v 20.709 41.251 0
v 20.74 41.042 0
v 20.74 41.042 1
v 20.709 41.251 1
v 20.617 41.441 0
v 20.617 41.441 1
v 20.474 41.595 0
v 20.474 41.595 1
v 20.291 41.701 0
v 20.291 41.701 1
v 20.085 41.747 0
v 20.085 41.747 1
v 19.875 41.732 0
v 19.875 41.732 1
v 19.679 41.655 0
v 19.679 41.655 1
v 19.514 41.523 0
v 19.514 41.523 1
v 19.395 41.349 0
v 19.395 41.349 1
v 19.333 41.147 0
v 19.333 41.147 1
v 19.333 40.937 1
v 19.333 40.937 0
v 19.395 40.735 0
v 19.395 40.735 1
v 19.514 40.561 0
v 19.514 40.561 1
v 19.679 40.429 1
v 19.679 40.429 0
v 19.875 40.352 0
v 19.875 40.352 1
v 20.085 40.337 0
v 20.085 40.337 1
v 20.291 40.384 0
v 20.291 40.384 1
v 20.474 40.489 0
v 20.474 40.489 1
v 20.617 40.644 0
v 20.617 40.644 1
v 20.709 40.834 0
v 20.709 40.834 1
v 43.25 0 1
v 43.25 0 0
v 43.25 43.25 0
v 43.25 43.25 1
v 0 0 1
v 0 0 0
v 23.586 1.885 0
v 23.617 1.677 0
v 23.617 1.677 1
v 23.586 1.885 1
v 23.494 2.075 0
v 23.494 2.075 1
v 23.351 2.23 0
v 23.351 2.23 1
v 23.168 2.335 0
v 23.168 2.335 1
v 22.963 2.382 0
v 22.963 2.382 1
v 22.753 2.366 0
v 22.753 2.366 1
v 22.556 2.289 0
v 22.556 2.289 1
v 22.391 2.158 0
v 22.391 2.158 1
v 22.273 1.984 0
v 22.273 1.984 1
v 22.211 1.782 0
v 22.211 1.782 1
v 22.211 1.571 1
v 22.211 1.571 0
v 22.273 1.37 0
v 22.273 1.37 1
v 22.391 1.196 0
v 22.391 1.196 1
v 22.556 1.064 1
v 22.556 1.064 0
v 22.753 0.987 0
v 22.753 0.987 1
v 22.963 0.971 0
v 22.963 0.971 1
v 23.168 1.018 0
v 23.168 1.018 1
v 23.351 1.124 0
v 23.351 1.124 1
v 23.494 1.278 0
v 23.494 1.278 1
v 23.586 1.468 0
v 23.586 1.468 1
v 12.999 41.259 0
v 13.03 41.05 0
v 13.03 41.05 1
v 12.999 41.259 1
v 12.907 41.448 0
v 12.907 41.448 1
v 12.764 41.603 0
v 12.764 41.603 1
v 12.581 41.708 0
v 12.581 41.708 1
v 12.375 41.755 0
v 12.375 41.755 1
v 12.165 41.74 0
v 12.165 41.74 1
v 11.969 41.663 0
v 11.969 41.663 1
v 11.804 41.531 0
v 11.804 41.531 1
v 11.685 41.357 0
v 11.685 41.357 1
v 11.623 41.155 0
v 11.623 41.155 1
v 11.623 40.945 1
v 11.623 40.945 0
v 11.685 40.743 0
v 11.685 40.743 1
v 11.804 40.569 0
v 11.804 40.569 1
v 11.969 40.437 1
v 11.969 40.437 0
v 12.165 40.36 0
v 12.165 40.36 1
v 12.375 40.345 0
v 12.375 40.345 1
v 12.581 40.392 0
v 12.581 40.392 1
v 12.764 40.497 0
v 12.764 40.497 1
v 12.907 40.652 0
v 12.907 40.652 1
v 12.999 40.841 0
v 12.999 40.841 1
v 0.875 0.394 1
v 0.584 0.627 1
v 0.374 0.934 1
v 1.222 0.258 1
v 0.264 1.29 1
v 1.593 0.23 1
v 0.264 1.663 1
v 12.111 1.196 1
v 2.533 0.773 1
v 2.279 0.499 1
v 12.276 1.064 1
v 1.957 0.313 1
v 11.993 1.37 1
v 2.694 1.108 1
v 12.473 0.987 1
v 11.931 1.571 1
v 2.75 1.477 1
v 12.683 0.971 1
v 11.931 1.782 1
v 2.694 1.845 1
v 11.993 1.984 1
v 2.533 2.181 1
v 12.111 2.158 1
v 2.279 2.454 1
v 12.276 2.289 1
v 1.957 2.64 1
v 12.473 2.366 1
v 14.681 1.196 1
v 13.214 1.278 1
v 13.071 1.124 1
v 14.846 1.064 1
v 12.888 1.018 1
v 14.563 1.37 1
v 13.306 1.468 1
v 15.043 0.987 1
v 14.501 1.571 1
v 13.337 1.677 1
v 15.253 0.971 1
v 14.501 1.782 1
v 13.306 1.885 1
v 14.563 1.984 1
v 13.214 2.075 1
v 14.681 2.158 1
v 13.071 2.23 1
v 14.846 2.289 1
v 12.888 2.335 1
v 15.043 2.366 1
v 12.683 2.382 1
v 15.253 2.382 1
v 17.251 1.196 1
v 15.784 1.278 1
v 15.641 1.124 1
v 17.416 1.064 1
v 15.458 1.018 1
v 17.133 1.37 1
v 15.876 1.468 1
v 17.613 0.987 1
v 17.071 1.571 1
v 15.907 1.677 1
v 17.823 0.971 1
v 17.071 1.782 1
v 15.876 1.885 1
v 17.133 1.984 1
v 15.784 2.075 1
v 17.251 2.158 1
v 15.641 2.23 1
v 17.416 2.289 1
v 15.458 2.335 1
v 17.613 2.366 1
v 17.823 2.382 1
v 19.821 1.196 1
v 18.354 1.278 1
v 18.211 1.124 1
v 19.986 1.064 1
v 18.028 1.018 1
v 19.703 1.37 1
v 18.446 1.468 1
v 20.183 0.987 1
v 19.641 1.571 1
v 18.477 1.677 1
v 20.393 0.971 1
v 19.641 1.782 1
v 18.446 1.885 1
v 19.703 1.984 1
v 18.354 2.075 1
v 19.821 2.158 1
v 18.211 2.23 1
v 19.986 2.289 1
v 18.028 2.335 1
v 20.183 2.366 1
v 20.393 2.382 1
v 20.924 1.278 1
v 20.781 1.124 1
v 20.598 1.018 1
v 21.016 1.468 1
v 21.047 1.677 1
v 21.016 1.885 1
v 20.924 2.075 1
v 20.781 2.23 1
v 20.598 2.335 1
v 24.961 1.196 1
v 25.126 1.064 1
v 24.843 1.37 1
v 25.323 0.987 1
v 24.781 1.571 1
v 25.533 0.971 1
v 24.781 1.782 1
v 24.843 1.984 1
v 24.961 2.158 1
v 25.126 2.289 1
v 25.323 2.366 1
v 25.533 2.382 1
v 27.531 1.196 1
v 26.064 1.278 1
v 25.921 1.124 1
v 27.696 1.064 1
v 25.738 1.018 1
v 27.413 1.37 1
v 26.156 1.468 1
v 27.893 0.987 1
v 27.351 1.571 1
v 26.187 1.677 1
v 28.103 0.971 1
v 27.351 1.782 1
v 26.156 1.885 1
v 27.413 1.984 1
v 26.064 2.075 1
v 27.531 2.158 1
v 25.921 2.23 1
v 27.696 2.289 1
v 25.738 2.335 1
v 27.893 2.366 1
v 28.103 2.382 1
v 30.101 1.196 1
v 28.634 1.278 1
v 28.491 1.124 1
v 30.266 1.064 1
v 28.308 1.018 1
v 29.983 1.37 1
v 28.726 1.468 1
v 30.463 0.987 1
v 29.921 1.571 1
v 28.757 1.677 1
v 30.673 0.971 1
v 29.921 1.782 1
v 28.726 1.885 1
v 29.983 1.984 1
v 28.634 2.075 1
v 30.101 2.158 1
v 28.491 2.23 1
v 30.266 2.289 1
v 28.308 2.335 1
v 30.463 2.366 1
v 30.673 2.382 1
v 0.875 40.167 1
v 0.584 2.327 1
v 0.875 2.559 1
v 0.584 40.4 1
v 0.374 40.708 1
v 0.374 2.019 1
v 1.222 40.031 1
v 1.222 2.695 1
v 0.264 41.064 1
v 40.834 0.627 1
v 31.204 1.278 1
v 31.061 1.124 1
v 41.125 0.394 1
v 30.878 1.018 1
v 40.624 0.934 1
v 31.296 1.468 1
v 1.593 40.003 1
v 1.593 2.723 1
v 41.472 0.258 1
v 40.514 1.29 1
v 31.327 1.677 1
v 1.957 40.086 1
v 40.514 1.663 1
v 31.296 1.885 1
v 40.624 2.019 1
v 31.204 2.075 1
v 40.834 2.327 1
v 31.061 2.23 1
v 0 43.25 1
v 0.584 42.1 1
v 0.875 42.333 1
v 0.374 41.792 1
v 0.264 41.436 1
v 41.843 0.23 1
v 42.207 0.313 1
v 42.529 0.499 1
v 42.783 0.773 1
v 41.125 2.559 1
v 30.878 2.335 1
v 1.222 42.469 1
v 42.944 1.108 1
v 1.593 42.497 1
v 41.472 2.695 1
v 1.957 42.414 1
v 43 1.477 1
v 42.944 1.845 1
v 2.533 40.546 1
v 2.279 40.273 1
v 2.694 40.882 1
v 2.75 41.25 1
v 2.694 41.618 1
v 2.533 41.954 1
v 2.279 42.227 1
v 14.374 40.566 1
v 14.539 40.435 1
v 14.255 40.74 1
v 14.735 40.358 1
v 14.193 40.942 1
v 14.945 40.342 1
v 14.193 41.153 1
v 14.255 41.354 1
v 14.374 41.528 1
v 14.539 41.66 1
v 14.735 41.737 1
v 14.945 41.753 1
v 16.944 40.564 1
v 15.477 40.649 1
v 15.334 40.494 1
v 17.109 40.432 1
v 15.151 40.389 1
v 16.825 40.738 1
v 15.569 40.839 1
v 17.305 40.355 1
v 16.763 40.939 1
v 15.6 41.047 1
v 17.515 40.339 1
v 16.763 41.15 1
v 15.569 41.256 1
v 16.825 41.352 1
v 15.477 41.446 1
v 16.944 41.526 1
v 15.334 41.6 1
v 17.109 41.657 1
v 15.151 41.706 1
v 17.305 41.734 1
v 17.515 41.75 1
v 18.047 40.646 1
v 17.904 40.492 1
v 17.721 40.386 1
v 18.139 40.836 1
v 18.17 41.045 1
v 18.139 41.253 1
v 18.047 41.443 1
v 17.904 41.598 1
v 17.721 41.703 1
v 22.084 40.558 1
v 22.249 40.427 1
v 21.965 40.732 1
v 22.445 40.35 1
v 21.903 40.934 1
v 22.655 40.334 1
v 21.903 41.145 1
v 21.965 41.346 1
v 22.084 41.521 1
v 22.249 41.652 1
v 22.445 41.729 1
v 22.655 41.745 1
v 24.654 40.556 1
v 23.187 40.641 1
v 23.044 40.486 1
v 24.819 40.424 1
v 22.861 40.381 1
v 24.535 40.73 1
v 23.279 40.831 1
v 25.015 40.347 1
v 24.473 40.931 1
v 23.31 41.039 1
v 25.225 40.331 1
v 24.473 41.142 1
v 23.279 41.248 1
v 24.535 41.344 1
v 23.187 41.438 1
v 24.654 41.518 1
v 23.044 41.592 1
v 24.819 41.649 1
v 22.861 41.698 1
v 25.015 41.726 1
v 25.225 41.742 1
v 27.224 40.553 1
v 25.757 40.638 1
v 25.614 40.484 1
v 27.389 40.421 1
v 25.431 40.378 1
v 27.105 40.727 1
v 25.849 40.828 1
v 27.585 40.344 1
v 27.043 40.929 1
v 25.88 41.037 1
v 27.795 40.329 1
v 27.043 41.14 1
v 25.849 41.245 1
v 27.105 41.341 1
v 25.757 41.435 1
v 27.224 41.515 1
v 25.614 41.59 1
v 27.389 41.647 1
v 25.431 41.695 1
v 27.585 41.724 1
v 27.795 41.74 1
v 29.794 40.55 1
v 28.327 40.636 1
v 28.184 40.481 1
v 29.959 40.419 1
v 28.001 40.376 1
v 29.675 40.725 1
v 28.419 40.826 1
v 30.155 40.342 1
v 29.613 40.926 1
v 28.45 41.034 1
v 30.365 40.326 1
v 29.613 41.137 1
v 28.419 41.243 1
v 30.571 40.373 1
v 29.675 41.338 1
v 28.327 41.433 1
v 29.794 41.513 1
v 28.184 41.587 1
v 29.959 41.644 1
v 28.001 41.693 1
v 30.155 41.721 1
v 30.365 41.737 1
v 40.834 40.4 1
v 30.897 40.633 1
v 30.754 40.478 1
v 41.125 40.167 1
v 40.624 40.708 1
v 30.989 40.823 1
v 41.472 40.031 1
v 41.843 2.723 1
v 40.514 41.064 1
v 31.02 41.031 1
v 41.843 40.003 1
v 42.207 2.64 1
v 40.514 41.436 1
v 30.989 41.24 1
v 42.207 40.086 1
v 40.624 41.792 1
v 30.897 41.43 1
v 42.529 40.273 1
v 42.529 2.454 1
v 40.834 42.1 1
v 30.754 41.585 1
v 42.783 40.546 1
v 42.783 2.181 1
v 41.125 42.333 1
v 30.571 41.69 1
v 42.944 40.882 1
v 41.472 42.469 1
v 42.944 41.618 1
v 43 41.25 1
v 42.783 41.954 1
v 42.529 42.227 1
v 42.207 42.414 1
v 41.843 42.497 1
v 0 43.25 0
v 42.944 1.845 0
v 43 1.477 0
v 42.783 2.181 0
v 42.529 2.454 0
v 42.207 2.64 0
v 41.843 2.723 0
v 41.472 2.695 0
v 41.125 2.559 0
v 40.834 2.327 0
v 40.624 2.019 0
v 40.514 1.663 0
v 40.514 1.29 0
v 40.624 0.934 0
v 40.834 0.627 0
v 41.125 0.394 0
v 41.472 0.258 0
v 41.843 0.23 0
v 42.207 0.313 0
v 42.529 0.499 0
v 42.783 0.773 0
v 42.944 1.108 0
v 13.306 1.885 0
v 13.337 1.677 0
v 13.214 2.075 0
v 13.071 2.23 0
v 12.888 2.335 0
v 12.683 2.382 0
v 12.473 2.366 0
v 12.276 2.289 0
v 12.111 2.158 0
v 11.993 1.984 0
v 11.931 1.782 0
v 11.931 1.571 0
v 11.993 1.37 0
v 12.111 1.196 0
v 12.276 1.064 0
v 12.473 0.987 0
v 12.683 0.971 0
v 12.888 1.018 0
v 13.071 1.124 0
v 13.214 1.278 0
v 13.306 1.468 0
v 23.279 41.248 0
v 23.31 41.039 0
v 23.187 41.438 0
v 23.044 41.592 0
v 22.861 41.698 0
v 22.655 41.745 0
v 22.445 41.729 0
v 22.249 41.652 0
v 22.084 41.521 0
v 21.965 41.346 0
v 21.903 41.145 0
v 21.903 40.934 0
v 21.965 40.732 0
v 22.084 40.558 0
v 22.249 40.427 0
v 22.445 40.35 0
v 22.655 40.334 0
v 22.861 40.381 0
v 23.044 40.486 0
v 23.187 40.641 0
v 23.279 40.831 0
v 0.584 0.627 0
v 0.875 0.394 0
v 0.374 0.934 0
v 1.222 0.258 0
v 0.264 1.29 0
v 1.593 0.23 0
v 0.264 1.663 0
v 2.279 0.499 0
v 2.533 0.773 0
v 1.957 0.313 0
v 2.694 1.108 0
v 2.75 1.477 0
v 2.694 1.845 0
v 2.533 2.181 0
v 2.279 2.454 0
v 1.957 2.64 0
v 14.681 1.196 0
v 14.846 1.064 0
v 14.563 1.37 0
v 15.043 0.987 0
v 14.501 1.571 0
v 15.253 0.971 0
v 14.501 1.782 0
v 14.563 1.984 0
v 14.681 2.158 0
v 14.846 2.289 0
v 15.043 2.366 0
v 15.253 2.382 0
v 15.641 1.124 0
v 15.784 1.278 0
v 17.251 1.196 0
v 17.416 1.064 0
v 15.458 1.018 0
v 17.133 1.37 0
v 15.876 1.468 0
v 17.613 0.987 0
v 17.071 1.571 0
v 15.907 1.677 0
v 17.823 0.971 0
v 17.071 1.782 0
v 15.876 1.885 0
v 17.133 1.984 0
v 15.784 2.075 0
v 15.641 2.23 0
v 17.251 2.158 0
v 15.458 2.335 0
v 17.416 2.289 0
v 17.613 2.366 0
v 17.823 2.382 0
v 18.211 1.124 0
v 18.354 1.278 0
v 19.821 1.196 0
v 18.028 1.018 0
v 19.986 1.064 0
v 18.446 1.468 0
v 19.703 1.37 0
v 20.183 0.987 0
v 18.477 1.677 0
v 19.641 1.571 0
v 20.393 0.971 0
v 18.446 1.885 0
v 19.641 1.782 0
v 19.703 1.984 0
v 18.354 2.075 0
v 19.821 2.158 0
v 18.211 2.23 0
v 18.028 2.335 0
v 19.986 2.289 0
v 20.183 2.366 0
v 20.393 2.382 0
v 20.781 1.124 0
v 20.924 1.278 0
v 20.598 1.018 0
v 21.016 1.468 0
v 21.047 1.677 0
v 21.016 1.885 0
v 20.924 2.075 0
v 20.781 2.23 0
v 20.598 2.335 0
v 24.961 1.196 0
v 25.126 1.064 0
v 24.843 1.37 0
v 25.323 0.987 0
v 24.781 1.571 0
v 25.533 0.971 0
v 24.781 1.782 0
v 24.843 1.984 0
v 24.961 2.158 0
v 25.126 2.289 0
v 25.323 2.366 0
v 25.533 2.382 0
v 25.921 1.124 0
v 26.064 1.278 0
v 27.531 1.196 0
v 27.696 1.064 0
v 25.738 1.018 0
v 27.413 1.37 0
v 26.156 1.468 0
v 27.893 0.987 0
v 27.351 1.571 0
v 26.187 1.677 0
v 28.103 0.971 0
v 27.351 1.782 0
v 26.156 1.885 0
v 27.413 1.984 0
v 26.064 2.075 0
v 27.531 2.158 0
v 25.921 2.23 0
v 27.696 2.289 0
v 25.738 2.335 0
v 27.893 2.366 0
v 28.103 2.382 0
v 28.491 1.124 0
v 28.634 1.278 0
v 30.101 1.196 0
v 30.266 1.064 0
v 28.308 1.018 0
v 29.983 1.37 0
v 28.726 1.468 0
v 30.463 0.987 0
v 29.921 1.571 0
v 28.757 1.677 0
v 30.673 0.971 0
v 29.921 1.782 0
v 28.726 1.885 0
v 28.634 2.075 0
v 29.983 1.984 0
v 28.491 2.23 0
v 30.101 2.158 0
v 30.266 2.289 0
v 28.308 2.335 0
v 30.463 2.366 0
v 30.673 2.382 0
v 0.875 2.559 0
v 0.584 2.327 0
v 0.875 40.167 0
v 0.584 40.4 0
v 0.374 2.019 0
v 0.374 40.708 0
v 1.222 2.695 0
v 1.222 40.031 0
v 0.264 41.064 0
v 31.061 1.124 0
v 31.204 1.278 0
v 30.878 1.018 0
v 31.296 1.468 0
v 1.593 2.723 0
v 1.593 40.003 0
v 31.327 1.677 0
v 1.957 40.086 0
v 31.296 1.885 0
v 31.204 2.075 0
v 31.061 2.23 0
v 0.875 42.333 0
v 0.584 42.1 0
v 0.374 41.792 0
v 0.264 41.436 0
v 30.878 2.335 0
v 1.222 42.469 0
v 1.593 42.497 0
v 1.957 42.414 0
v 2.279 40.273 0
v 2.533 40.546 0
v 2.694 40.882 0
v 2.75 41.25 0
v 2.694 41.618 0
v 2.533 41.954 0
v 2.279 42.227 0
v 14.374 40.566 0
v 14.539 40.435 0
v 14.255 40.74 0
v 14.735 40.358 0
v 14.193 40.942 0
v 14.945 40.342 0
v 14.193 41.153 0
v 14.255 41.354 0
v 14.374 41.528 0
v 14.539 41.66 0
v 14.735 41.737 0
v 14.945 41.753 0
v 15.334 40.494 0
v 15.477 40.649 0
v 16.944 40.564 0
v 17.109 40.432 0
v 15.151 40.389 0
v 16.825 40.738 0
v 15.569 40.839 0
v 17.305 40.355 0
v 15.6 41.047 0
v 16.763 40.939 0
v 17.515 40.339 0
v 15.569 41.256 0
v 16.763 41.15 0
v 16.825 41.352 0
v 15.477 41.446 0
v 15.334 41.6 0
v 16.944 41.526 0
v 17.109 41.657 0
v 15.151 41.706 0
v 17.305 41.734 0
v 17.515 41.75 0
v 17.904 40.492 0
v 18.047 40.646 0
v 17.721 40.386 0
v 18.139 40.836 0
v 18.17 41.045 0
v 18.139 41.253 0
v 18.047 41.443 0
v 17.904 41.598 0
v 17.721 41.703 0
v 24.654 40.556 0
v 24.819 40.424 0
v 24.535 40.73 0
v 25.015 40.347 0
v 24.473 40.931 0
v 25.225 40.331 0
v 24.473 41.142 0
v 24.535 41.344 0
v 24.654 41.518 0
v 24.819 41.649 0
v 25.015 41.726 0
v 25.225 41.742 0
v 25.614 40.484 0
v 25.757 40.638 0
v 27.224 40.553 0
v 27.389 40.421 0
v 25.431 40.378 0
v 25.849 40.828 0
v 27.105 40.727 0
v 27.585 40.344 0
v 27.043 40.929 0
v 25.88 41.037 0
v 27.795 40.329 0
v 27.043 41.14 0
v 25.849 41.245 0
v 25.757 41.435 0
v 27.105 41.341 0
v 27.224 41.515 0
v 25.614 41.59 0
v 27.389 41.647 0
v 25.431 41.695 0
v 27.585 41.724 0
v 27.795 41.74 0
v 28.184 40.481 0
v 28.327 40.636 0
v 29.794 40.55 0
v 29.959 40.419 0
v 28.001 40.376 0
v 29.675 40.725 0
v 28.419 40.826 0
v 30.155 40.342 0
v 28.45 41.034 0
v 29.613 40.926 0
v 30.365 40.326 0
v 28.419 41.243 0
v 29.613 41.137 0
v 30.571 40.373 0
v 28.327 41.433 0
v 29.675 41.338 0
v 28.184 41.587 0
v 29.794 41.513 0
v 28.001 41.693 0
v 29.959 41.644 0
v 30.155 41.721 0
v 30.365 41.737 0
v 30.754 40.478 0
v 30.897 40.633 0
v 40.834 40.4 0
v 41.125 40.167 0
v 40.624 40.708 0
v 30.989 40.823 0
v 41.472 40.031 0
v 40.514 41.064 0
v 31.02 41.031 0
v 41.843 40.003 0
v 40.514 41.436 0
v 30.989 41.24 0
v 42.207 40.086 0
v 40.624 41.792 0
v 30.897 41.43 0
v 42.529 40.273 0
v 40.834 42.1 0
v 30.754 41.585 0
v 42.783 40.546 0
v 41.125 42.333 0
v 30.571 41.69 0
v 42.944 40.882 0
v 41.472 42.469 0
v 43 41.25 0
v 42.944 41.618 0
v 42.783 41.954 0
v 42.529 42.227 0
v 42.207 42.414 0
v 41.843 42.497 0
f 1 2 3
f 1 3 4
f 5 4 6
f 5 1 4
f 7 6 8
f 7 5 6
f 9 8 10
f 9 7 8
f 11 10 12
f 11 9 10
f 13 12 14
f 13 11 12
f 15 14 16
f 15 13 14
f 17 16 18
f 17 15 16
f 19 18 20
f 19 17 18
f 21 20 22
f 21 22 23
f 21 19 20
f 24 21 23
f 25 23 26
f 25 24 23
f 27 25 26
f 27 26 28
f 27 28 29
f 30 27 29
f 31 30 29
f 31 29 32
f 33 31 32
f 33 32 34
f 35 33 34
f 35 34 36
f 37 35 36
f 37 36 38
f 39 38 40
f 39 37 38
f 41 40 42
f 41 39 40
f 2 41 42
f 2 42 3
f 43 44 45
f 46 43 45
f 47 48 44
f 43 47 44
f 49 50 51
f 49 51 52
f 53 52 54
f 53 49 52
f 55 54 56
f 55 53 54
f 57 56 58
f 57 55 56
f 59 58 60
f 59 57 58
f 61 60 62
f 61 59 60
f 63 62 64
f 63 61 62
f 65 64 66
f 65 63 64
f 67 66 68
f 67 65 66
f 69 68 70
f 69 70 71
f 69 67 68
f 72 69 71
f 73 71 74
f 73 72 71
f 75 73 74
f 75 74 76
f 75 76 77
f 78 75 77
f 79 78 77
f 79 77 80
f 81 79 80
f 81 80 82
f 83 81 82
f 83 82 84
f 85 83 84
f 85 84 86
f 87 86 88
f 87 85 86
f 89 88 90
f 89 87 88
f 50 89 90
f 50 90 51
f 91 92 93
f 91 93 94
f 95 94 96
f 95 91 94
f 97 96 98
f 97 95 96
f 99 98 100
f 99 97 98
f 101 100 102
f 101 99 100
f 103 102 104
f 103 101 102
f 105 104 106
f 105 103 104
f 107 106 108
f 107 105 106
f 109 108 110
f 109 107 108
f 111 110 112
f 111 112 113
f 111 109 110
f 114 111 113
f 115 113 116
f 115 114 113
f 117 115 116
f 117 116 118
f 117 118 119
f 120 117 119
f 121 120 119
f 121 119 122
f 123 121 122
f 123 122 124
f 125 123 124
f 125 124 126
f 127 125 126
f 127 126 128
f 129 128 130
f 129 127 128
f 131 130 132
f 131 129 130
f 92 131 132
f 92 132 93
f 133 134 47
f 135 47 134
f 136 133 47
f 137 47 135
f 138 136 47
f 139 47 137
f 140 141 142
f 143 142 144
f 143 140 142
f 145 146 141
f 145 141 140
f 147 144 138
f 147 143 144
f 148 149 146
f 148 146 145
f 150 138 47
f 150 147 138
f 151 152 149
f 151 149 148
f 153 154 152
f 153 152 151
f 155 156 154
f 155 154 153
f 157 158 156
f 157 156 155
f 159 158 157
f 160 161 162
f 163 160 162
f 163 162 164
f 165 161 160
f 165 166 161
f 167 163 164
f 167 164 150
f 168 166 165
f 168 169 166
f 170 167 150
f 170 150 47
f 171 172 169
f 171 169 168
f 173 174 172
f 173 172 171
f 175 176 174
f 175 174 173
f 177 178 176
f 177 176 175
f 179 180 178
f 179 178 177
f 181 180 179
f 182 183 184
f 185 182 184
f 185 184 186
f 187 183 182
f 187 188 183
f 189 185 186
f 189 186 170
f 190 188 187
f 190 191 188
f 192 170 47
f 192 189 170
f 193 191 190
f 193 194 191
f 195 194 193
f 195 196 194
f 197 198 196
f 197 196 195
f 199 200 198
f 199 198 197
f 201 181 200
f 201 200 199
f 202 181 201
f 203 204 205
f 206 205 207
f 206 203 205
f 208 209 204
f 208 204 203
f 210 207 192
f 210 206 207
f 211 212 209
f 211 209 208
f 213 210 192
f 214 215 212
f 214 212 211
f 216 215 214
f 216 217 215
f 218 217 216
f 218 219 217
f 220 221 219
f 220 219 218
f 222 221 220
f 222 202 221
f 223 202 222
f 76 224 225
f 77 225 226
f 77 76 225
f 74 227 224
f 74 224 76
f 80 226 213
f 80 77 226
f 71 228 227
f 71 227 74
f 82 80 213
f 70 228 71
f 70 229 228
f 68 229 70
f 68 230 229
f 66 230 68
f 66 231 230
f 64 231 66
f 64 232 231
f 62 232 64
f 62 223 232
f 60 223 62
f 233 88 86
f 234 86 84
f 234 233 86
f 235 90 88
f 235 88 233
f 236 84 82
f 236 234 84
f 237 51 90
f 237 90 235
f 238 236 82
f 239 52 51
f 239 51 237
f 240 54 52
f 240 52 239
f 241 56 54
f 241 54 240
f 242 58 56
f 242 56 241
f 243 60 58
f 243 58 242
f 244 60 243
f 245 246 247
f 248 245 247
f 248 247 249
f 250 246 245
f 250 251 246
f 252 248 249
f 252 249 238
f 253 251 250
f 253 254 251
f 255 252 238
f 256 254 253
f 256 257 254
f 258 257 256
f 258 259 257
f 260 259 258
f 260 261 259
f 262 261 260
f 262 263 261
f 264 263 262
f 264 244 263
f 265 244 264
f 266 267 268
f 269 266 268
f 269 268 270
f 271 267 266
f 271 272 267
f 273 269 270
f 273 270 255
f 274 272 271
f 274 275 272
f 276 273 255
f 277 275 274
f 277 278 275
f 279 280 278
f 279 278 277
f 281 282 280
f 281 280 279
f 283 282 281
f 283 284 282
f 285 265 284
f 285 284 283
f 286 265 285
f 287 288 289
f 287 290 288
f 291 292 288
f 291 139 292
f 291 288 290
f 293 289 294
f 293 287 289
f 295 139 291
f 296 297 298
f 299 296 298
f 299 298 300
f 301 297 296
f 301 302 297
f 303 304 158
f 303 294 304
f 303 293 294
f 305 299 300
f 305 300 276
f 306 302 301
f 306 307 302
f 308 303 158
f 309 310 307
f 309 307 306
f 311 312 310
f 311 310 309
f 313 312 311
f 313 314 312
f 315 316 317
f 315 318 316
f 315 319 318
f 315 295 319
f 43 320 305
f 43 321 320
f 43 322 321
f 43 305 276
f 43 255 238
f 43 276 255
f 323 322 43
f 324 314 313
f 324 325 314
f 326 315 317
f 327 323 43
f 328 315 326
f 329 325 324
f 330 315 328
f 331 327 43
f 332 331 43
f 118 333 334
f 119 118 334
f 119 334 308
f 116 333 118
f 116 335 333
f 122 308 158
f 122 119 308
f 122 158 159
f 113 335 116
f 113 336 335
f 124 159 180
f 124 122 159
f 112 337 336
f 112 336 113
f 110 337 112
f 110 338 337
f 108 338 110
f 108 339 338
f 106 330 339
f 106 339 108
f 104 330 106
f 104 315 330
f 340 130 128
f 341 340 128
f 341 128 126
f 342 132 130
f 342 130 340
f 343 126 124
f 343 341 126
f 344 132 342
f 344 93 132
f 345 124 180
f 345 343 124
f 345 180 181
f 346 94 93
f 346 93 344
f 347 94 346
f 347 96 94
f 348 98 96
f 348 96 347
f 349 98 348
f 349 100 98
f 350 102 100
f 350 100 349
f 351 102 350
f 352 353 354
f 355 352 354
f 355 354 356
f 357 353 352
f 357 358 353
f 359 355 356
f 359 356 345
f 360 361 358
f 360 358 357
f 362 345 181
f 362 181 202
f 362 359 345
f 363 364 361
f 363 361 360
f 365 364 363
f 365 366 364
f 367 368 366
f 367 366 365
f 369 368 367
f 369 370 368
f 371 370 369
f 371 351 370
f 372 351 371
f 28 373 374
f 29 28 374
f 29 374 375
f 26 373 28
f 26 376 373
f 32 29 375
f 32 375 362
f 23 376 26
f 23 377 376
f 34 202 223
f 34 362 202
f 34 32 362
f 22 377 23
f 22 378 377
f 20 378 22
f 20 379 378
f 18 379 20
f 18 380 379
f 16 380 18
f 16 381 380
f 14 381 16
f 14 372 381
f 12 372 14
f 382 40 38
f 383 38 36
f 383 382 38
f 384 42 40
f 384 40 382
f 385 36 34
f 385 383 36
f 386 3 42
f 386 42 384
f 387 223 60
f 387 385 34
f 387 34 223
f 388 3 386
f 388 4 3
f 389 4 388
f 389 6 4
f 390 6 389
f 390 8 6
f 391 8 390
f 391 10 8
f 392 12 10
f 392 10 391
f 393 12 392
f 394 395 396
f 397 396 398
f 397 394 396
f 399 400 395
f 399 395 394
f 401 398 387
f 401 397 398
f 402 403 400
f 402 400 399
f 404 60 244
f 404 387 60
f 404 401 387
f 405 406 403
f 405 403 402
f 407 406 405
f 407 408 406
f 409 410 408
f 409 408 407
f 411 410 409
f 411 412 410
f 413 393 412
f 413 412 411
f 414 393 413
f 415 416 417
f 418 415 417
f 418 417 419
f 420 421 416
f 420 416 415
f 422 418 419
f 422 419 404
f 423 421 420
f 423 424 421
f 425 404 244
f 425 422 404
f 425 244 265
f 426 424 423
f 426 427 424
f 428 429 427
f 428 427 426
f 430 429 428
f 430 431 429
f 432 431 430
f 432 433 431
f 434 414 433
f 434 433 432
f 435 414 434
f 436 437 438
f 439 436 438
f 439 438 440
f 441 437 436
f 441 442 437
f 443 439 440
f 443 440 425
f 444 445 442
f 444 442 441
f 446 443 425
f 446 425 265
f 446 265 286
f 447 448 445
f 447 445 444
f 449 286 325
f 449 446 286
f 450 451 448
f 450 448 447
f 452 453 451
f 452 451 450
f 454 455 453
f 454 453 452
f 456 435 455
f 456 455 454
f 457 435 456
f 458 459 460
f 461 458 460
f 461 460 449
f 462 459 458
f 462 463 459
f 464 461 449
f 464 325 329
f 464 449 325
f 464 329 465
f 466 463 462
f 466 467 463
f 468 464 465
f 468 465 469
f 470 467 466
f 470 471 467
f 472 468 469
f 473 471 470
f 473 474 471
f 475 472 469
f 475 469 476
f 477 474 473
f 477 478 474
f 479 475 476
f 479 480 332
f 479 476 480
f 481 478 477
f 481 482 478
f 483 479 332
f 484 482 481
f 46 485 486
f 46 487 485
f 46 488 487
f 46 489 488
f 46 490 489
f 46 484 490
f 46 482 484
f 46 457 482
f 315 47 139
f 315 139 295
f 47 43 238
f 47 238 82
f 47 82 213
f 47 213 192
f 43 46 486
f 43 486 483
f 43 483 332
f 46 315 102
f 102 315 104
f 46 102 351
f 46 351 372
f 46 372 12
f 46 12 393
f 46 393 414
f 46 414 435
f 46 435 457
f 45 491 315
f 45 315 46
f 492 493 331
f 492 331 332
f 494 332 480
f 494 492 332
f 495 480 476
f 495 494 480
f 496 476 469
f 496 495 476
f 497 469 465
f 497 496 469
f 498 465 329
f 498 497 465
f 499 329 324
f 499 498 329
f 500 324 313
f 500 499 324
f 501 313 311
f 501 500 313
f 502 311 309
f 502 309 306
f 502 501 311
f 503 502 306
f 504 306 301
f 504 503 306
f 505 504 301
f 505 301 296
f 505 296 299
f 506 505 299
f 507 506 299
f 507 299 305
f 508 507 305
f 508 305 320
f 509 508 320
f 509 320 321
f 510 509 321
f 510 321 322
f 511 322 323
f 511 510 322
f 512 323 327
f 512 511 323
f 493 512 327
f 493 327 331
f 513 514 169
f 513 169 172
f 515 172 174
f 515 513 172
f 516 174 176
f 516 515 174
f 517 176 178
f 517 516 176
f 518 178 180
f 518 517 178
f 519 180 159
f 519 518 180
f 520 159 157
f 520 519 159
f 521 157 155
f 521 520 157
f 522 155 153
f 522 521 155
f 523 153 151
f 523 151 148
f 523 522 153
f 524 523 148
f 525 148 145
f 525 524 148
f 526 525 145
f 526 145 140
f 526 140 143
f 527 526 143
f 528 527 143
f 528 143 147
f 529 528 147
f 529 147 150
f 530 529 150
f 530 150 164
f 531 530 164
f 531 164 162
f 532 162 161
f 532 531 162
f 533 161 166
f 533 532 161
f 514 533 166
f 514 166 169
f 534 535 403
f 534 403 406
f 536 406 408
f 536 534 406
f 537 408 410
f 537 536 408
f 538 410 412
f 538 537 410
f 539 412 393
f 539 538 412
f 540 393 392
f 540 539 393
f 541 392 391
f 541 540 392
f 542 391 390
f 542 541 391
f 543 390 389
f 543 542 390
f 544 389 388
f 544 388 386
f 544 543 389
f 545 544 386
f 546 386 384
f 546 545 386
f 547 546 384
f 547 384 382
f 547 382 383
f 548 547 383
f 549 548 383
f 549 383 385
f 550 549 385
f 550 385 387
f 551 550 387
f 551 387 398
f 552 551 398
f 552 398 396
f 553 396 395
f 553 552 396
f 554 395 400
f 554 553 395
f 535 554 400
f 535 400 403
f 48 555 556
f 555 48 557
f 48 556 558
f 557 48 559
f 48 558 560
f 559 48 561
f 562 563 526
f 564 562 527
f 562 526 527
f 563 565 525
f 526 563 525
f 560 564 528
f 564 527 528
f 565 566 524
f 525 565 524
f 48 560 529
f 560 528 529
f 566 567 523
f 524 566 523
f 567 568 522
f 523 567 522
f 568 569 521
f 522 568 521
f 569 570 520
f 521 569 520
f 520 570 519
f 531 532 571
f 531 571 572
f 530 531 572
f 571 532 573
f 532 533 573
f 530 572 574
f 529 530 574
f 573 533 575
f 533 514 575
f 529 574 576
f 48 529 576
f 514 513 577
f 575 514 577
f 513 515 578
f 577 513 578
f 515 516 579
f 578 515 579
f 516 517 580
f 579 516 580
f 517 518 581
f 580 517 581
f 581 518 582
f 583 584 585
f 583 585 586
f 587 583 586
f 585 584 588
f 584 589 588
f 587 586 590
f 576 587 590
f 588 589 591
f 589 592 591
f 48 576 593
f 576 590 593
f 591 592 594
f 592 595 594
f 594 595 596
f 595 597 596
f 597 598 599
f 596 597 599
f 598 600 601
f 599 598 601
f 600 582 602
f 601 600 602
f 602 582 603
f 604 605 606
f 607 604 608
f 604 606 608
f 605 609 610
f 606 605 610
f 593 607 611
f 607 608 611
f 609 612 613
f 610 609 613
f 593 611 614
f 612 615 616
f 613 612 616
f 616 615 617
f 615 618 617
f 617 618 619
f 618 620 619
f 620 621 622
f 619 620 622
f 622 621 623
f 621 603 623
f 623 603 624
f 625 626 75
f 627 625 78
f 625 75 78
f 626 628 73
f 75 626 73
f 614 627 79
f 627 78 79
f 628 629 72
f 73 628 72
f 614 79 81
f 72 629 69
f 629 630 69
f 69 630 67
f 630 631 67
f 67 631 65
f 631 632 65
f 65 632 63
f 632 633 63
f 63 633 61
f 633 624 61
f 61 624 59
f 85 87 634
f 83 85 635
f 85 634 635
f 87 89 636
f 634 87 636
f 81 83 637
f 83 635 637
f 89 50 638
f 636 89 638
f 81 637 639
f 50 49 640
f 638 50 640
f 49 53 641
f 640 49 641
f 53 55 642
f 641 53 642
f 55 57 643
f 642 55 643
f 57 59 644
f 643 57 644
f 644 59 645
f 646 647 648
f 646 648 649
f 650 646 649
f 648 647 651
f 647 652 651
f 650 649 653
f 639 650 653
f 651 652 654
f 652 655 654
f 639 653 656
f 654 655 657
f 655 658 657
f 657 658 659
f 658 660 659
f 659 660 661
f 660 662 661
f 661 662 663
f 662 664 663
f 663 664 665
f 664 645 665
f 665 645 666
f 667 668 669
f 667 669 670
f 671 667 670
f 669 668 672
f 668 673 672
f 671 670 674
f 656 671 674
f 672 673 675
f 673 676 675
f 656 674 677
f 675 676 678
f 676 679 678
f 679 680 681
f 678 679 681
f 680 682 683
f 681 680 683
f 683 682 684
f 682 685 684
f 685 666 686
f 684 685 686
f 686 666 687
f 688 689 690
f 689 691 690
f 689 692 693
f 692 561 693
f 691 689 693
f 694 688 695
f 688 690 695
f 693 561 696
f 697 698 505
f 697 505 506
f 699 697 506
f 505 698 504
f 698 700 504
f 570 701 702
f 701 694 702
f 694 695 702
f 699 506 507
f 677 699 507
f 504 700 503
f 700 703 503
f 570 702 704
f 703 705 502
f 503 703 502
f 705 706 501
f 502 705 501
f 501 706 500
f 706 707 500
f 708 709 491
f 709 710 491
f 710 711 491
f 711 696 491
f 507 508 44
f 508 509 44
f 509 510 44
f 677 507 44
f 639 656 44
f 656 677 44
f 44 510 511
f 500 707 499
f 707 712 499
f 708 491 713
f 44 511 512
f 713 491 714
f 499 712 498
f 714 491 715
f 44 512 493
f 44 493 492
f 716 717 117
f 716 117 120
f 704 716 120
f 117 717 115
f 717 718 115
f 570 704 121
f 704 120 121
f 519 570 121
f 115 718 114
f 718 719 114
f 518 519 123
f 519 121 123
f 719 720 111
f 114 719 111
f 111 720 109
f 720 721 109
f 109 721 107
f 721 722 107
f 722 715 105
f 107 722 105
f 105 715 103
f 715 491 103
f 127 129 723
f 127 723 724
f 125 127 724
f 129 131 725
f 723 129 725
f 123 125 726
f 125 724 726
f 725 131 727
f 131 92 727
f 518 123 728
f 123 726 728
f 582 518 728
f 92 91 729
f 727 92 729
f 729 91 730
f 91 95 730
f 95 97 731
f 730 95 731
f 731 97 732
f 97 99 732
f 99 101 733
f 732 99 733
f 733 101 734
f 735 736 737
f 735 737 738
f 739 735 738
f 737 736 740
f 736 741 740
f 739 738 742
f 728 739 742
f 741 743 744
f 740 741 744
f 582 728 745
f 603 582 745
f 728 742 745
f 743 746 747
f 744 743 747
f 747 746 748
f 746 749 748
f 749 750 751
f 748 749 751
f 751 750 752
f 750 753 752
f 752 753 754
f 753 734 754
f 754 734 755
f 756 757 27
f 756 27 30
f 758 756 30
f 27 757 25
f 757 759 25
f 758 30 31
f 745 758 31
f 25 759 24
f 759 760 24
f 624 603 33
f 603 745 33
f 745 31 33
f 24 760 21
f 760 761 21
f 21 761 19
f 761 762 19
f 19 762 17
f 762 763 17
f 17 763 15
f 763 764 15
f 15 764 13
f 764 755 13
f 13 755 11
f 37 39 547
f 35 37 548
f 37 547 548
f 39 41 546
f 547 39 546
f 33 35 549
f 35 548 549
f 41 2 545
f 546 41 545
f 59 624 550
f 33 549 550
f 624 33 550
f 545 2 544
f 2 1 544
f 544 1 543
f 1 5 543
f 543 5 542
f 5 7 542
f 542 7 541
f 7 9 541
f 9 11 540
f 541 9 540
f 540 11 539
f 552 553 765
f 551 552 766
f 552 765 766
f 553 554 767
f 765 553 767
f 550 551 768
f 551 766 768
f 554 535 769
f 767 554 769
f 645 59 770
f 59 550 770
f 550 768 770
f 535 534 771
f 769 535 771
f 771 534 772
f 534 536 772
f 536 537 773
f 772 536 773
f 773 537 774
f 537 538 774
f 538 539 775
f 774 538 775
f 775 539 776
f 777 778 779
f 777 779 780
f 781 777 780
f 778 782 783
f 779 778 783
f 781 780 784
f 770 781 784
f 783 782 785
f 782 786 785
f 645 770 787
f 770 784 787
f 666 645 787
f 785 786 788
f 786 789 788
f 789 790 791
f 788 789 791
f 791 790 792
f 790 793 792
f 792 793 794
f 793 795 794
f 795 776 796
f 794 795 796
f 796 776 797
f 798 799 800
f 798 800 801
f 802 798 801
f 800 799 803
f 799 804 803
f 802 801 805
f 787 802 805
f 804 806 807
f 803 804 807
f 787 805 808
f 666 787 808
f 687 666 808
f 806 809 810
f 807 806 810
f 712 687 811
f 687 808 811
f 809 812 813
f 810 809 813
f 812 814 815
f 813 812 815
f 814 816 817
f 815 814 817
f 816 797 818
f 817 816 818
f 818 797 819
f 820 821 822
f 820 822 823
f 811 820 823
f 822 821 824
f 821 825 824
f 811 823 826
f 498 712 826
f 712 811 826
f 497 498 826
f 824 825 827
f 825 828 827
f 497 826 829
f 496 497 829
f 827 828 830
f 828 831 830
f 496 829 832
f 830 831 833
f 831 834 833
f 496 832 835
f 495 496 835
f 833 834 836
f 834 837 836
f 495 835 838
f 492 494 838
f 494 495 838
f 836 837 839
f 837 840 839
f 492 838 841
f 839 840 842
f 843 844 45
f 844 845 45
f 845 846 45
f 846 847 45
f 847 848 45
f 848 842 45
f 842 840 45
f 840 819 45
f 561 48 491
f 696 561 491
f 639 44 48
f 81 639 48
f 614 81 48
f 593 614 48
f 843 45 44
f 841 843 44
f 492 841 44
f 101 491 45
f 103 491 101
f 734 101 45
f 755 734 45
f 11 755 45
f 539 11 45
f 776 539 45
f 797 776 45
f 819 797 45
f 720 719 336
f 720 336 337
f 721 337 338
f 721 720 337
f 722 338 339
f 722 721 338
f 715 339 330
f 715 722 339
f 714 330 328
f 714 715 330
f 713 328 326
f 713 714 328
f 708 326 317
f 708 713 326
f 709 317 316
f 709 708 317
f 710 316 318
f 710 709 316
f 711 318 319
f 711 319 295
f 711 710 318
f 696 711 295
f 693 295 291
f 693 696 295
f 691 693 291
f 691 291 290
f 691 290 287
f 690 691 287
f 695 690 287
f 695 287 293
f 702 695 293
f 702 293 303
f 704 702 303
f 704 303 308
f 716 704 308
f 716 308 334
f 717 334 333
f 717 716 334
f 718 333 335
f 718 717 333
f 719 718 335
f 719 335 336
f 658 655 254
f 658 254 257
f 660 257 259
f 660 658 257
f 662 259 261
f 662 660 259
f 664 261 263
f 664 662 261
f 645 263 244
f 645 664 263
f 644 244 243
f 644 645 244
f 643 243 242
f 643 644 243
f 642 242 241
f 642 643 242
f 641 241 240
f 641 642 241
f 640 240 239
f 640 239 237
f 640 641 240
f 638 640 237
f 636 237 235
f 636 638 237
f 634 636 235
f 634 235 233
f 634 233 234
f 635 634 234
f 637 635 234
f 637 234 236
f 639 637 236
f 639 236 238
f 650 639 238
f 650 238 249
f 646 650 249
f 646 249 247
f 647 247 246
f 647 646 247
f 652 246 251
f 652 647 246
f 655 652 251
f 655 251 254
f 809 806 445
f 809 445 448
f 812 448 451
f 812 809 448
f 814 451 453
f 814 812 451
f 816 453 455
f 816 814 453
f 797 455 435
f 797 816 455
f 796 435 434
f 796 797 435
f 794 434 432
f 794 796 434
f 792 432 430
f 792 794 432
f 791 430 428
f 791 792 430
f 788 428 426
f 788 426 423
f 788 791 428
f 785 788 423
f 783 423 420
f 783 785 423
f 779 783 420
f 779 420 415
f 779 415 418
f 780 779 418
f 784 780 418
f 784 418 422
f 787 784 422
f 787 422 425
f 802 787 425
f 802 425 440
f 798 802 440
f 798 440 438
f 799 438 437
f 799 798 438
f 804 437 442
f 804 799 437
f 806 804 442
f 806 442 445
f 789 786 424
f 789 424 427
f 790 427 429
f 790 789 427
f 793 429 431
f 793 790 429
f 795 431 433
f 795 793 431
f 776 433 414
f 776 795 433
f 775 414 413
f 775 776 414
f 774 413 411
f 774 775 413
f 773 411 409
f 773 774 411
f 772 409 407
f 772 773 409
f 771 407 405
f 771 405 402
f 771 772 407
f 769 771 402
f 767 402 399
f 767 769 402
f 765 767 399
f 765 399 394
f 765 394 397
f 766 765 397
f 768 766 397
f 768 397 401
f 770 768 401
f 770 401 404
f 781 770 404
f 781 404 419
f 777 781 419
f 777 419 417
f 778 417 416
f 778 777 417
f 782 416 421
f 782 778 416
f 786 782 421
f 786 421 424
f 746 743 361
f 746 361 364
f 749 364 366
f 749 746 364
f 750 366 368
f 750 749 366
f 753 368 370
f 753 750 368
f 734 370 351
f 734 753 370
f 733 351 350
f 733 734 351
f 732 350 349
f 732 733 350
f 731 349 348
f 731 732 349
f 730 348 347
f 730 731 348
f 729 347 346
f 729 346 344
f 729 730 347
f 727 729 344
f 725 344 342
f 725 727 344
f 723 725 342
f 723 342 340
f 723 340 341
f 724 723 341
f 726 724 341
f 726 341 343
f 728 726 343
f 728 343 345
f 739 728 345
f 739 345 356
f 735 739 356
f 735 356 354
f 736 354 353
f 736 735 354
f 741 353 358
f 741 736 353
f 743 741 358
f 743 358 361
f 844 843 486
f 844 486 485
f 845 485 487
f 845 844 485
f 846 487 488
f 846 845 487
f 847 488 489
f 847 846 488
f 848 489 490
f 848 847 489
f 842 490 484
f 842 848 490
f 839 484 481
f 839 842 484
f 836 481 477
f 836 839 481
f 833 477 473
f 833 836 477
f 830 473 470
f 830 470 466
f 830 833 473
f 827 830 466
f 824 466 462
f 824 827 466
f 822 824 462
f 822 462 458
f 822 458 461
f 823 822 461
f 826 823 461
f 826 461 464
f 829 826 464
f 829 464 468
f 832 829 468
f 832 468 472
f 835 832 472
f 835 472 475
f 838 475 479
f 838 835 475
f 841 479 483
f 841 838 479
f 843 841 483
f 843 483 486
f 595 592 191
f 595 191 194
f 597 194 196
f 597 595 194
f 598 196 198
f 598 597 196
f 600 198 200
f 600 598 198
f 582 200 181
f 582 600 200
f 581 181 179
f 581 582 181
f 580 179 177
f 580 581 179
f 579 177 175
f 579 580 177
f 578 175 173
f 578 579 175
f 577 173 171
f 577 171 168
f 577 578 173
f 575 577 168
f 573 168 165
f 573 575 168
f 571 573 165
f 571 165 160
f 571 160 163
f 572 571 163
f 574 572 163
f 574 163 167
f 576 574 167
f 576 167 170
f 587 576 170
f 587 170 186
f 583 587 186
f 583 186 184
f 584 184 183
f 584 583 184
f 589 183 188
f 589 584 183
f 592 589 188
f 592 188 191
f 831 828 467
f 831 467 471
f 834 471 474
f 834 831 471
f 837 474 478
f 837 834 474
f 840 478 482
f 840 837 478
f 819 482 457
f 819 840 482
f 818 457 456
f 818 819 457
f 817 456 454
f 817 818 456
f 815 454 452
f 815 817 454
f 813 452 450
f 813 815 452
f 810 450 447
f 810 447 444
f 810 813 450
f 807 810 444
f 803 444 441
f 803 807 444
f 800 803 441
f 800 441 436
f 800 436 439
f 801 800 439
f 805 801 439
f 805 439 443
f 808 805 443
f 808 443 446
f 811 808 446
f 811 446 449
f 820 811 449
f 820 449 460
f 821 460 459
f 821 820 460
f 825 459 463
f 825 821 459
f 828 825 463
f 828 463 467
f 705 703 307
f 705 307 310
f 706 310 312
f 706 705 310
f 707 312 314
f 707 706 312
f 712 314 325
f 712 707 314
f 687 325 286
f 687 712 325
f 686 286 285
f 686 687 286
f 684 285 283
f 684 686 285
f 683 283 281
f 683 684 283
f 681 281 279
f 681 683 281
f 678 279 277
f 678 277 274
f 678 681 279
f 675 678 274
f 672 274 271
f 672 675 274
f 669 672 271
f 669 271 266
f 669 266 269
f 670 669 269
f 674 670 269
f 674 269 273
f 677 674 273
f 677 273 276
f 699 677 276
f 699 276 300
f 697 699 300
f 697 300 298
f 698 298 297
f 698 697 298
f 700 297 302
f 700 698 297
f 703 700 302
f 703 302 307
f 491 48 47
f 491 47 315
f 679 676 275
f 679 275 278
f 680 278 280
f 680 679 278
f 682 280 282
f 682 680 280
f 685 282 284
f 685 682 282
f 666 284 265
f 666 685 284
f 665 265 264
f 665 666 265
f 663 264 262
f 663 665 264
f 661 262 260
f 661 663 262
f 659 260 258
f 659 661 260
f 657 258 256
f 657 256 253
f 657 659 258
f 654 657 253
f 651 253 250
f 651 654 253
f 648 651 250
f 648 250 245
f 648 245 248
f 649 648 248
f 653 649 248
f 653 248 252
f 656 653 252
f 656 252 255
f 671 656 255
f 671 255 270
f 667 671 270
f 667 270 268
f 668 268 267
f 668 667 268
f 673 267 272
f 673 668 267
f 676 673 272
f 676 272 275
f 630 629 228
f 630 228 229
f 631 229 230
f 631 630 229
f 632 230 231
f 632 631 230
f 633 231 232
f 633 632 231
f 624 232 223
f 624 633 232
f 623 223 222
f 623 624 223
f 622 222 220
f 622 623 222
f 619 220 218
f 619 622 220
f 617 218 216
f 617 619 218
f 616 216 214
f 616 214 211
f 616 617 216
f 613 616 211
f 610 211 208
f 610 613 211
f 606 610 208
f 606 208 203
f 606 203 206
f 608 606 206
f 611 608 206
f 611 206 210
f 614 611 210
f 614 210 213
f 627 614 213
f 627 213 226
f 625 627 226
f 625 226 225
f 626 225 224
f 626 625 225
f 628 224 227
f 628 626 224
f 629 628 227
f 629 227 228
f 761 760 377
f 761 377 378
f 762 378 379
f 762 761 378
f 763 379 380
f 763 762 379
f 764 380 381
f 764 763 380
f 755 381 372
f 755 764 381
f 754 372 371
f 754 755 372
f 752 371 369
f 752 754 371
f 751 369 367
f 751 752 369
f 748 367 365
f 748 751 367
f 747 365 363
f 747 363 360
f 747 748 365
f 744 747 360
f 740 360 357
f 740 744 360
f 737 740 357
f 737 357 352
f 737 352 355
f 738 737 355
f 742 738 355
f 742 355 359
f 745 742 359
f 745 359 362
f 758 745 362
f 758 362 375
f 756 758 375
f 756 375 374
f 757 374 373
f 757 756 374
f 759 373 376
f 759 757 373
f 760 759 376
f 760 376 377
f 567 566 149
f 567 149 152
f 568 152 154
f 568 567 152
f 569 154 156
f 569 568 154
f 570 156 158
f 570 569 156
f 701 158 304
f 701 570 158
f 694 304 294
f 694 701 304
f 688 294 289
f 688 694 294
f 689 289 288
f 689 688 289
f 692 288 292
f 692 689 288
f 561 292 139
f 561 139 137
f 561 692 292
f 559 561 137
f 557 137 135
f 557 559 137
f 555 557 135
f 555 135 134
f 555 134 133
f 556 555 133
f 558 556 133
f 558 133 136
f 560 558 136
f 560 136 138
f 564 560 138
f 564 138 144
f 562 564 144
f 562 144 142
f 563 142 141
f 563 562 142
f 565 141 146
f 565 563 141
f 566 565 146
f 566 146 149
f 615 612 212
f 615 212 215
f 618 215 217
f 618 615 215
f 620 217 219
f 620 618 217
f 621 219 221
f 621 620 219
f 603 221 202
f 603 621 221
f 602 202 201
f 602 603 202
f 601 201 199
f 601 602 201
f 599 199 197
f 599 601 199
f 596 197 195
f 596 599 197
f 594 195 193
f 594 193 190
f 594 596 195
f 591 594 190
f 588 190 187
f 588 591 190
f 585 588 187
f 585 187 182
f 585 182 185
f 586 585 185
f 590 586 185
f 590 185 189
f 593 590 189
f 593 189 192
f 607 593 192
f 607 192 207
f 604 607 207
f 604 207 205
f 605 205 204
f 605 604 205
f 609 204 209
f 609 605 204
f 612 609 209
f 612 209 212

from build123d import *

# Parameters (mm, degrees)
ESBO_O1_W                = 43.25
ESBO_O1_H                = 43.25
ESBO_O1_R                = 1.25
ESBO_O1_R_2              = 0.707384329
RESSALTO_EXTRUS_O2_DEPTH = 1


with BuildPart() as part:
    # Esboço1 → Ressalto-extrusão2 (new body)
    with BuildSketch(Plane.XY):
        with Locations((21.625, 21.625)):
            Rectangle(ESBO_O1_W, ESBO_O1_H)
        with Locations((1.5, 41.25)):
            Circle(ESBO_O1_R, mode=Mode.SUBTRACT)
        with Locations((12.322576567, 41.05)):
            Circle(ESBO_O1_R_2, mode=Mode.SUBTRACT)
        with Locations((41.75, 41.25)):
            Circle(ESBO_O1_R, mode=Mode.SUBTRACT)
        with Locations((14.892575201, 41.047350464)):
            Circle(ESBO_O1_R_2, mode=Mode.SUBTRACT)
        with Locations((17.462573835, 41.044700929)):
            Circle(ESBO_O1_R_2, mode=Mode.SUBTRACT)
        with Locations((20.03257247, 41.042051393)):
            Circle(ESBO_O1_R_2, mode=Mode.SUBTRACT)
        with Locations((22.602571104, 41.039401857)):
            Circle(ESBO_O1_R_2, mode=Mode.SUBTRACT)
        with Locations((25.172569738, 41.036752321)):
            Circle(ESBO_O1_R_2, mode=Mode.SUBTRACT)
        with Locations((27.742568372, 41.034102786)):
            Circle(ESBO_O1_R_2, mode=Mode.SUBTRACT)
        with Locations((30.312567007, 41.03145325)):
            Circle(ESBO_O1_R_2, mode=Mode.SUBTRACT)
        with Locations((30.62, 1.67673648)):
            Circle(ESBO_O1_R_2, mode=Mode.SUBTRACT)
        with Locations((28.05, 1.67673648)):
            Circle(ESBO_O1_R_2, mode=Mode.SUBTRACT)
        with Locations((25.48, 1.67673648)):
            Circle(ESBO_O1_R_2, mode=Mode.SUBTRACT)
        with Locations((22.91, 1.67673648)):
            Circle(ESBO_O1_R_2, mode=Mode.SUBTRACT)
        with Locations((20.34, 1.67673648)):
            Circle(ESBO_O1_R_2, mode=Mode.SUBTRACT)
        with Locations((17.77, 1.67673648)):
            Circle(ESBO_O1_R_2, mode=Mode.SUBTRACT)
        with Locations((15.2, 1.67673648)):
            Circle(ESBO_O1_R_2, mode=Mode.SUBTRACT)
        with Locations((41.75, 1.47673648)):
            Circle(ESBO_O1_R, mode=Mode.SUBTRACT)
        with Locations((12.63, 1.67673648)):
            Circle(ESBO_O1_R_2, mode=Mode.SUBTRACT)
        with Locations((1.5, 1.47673648)):
            Circle(ESBO_O1_R, mode=Mode.SUBTRACT)
    extrude(amount=RESSALTO_EXTRUS_O2_DEPTH)


solid = part.part
